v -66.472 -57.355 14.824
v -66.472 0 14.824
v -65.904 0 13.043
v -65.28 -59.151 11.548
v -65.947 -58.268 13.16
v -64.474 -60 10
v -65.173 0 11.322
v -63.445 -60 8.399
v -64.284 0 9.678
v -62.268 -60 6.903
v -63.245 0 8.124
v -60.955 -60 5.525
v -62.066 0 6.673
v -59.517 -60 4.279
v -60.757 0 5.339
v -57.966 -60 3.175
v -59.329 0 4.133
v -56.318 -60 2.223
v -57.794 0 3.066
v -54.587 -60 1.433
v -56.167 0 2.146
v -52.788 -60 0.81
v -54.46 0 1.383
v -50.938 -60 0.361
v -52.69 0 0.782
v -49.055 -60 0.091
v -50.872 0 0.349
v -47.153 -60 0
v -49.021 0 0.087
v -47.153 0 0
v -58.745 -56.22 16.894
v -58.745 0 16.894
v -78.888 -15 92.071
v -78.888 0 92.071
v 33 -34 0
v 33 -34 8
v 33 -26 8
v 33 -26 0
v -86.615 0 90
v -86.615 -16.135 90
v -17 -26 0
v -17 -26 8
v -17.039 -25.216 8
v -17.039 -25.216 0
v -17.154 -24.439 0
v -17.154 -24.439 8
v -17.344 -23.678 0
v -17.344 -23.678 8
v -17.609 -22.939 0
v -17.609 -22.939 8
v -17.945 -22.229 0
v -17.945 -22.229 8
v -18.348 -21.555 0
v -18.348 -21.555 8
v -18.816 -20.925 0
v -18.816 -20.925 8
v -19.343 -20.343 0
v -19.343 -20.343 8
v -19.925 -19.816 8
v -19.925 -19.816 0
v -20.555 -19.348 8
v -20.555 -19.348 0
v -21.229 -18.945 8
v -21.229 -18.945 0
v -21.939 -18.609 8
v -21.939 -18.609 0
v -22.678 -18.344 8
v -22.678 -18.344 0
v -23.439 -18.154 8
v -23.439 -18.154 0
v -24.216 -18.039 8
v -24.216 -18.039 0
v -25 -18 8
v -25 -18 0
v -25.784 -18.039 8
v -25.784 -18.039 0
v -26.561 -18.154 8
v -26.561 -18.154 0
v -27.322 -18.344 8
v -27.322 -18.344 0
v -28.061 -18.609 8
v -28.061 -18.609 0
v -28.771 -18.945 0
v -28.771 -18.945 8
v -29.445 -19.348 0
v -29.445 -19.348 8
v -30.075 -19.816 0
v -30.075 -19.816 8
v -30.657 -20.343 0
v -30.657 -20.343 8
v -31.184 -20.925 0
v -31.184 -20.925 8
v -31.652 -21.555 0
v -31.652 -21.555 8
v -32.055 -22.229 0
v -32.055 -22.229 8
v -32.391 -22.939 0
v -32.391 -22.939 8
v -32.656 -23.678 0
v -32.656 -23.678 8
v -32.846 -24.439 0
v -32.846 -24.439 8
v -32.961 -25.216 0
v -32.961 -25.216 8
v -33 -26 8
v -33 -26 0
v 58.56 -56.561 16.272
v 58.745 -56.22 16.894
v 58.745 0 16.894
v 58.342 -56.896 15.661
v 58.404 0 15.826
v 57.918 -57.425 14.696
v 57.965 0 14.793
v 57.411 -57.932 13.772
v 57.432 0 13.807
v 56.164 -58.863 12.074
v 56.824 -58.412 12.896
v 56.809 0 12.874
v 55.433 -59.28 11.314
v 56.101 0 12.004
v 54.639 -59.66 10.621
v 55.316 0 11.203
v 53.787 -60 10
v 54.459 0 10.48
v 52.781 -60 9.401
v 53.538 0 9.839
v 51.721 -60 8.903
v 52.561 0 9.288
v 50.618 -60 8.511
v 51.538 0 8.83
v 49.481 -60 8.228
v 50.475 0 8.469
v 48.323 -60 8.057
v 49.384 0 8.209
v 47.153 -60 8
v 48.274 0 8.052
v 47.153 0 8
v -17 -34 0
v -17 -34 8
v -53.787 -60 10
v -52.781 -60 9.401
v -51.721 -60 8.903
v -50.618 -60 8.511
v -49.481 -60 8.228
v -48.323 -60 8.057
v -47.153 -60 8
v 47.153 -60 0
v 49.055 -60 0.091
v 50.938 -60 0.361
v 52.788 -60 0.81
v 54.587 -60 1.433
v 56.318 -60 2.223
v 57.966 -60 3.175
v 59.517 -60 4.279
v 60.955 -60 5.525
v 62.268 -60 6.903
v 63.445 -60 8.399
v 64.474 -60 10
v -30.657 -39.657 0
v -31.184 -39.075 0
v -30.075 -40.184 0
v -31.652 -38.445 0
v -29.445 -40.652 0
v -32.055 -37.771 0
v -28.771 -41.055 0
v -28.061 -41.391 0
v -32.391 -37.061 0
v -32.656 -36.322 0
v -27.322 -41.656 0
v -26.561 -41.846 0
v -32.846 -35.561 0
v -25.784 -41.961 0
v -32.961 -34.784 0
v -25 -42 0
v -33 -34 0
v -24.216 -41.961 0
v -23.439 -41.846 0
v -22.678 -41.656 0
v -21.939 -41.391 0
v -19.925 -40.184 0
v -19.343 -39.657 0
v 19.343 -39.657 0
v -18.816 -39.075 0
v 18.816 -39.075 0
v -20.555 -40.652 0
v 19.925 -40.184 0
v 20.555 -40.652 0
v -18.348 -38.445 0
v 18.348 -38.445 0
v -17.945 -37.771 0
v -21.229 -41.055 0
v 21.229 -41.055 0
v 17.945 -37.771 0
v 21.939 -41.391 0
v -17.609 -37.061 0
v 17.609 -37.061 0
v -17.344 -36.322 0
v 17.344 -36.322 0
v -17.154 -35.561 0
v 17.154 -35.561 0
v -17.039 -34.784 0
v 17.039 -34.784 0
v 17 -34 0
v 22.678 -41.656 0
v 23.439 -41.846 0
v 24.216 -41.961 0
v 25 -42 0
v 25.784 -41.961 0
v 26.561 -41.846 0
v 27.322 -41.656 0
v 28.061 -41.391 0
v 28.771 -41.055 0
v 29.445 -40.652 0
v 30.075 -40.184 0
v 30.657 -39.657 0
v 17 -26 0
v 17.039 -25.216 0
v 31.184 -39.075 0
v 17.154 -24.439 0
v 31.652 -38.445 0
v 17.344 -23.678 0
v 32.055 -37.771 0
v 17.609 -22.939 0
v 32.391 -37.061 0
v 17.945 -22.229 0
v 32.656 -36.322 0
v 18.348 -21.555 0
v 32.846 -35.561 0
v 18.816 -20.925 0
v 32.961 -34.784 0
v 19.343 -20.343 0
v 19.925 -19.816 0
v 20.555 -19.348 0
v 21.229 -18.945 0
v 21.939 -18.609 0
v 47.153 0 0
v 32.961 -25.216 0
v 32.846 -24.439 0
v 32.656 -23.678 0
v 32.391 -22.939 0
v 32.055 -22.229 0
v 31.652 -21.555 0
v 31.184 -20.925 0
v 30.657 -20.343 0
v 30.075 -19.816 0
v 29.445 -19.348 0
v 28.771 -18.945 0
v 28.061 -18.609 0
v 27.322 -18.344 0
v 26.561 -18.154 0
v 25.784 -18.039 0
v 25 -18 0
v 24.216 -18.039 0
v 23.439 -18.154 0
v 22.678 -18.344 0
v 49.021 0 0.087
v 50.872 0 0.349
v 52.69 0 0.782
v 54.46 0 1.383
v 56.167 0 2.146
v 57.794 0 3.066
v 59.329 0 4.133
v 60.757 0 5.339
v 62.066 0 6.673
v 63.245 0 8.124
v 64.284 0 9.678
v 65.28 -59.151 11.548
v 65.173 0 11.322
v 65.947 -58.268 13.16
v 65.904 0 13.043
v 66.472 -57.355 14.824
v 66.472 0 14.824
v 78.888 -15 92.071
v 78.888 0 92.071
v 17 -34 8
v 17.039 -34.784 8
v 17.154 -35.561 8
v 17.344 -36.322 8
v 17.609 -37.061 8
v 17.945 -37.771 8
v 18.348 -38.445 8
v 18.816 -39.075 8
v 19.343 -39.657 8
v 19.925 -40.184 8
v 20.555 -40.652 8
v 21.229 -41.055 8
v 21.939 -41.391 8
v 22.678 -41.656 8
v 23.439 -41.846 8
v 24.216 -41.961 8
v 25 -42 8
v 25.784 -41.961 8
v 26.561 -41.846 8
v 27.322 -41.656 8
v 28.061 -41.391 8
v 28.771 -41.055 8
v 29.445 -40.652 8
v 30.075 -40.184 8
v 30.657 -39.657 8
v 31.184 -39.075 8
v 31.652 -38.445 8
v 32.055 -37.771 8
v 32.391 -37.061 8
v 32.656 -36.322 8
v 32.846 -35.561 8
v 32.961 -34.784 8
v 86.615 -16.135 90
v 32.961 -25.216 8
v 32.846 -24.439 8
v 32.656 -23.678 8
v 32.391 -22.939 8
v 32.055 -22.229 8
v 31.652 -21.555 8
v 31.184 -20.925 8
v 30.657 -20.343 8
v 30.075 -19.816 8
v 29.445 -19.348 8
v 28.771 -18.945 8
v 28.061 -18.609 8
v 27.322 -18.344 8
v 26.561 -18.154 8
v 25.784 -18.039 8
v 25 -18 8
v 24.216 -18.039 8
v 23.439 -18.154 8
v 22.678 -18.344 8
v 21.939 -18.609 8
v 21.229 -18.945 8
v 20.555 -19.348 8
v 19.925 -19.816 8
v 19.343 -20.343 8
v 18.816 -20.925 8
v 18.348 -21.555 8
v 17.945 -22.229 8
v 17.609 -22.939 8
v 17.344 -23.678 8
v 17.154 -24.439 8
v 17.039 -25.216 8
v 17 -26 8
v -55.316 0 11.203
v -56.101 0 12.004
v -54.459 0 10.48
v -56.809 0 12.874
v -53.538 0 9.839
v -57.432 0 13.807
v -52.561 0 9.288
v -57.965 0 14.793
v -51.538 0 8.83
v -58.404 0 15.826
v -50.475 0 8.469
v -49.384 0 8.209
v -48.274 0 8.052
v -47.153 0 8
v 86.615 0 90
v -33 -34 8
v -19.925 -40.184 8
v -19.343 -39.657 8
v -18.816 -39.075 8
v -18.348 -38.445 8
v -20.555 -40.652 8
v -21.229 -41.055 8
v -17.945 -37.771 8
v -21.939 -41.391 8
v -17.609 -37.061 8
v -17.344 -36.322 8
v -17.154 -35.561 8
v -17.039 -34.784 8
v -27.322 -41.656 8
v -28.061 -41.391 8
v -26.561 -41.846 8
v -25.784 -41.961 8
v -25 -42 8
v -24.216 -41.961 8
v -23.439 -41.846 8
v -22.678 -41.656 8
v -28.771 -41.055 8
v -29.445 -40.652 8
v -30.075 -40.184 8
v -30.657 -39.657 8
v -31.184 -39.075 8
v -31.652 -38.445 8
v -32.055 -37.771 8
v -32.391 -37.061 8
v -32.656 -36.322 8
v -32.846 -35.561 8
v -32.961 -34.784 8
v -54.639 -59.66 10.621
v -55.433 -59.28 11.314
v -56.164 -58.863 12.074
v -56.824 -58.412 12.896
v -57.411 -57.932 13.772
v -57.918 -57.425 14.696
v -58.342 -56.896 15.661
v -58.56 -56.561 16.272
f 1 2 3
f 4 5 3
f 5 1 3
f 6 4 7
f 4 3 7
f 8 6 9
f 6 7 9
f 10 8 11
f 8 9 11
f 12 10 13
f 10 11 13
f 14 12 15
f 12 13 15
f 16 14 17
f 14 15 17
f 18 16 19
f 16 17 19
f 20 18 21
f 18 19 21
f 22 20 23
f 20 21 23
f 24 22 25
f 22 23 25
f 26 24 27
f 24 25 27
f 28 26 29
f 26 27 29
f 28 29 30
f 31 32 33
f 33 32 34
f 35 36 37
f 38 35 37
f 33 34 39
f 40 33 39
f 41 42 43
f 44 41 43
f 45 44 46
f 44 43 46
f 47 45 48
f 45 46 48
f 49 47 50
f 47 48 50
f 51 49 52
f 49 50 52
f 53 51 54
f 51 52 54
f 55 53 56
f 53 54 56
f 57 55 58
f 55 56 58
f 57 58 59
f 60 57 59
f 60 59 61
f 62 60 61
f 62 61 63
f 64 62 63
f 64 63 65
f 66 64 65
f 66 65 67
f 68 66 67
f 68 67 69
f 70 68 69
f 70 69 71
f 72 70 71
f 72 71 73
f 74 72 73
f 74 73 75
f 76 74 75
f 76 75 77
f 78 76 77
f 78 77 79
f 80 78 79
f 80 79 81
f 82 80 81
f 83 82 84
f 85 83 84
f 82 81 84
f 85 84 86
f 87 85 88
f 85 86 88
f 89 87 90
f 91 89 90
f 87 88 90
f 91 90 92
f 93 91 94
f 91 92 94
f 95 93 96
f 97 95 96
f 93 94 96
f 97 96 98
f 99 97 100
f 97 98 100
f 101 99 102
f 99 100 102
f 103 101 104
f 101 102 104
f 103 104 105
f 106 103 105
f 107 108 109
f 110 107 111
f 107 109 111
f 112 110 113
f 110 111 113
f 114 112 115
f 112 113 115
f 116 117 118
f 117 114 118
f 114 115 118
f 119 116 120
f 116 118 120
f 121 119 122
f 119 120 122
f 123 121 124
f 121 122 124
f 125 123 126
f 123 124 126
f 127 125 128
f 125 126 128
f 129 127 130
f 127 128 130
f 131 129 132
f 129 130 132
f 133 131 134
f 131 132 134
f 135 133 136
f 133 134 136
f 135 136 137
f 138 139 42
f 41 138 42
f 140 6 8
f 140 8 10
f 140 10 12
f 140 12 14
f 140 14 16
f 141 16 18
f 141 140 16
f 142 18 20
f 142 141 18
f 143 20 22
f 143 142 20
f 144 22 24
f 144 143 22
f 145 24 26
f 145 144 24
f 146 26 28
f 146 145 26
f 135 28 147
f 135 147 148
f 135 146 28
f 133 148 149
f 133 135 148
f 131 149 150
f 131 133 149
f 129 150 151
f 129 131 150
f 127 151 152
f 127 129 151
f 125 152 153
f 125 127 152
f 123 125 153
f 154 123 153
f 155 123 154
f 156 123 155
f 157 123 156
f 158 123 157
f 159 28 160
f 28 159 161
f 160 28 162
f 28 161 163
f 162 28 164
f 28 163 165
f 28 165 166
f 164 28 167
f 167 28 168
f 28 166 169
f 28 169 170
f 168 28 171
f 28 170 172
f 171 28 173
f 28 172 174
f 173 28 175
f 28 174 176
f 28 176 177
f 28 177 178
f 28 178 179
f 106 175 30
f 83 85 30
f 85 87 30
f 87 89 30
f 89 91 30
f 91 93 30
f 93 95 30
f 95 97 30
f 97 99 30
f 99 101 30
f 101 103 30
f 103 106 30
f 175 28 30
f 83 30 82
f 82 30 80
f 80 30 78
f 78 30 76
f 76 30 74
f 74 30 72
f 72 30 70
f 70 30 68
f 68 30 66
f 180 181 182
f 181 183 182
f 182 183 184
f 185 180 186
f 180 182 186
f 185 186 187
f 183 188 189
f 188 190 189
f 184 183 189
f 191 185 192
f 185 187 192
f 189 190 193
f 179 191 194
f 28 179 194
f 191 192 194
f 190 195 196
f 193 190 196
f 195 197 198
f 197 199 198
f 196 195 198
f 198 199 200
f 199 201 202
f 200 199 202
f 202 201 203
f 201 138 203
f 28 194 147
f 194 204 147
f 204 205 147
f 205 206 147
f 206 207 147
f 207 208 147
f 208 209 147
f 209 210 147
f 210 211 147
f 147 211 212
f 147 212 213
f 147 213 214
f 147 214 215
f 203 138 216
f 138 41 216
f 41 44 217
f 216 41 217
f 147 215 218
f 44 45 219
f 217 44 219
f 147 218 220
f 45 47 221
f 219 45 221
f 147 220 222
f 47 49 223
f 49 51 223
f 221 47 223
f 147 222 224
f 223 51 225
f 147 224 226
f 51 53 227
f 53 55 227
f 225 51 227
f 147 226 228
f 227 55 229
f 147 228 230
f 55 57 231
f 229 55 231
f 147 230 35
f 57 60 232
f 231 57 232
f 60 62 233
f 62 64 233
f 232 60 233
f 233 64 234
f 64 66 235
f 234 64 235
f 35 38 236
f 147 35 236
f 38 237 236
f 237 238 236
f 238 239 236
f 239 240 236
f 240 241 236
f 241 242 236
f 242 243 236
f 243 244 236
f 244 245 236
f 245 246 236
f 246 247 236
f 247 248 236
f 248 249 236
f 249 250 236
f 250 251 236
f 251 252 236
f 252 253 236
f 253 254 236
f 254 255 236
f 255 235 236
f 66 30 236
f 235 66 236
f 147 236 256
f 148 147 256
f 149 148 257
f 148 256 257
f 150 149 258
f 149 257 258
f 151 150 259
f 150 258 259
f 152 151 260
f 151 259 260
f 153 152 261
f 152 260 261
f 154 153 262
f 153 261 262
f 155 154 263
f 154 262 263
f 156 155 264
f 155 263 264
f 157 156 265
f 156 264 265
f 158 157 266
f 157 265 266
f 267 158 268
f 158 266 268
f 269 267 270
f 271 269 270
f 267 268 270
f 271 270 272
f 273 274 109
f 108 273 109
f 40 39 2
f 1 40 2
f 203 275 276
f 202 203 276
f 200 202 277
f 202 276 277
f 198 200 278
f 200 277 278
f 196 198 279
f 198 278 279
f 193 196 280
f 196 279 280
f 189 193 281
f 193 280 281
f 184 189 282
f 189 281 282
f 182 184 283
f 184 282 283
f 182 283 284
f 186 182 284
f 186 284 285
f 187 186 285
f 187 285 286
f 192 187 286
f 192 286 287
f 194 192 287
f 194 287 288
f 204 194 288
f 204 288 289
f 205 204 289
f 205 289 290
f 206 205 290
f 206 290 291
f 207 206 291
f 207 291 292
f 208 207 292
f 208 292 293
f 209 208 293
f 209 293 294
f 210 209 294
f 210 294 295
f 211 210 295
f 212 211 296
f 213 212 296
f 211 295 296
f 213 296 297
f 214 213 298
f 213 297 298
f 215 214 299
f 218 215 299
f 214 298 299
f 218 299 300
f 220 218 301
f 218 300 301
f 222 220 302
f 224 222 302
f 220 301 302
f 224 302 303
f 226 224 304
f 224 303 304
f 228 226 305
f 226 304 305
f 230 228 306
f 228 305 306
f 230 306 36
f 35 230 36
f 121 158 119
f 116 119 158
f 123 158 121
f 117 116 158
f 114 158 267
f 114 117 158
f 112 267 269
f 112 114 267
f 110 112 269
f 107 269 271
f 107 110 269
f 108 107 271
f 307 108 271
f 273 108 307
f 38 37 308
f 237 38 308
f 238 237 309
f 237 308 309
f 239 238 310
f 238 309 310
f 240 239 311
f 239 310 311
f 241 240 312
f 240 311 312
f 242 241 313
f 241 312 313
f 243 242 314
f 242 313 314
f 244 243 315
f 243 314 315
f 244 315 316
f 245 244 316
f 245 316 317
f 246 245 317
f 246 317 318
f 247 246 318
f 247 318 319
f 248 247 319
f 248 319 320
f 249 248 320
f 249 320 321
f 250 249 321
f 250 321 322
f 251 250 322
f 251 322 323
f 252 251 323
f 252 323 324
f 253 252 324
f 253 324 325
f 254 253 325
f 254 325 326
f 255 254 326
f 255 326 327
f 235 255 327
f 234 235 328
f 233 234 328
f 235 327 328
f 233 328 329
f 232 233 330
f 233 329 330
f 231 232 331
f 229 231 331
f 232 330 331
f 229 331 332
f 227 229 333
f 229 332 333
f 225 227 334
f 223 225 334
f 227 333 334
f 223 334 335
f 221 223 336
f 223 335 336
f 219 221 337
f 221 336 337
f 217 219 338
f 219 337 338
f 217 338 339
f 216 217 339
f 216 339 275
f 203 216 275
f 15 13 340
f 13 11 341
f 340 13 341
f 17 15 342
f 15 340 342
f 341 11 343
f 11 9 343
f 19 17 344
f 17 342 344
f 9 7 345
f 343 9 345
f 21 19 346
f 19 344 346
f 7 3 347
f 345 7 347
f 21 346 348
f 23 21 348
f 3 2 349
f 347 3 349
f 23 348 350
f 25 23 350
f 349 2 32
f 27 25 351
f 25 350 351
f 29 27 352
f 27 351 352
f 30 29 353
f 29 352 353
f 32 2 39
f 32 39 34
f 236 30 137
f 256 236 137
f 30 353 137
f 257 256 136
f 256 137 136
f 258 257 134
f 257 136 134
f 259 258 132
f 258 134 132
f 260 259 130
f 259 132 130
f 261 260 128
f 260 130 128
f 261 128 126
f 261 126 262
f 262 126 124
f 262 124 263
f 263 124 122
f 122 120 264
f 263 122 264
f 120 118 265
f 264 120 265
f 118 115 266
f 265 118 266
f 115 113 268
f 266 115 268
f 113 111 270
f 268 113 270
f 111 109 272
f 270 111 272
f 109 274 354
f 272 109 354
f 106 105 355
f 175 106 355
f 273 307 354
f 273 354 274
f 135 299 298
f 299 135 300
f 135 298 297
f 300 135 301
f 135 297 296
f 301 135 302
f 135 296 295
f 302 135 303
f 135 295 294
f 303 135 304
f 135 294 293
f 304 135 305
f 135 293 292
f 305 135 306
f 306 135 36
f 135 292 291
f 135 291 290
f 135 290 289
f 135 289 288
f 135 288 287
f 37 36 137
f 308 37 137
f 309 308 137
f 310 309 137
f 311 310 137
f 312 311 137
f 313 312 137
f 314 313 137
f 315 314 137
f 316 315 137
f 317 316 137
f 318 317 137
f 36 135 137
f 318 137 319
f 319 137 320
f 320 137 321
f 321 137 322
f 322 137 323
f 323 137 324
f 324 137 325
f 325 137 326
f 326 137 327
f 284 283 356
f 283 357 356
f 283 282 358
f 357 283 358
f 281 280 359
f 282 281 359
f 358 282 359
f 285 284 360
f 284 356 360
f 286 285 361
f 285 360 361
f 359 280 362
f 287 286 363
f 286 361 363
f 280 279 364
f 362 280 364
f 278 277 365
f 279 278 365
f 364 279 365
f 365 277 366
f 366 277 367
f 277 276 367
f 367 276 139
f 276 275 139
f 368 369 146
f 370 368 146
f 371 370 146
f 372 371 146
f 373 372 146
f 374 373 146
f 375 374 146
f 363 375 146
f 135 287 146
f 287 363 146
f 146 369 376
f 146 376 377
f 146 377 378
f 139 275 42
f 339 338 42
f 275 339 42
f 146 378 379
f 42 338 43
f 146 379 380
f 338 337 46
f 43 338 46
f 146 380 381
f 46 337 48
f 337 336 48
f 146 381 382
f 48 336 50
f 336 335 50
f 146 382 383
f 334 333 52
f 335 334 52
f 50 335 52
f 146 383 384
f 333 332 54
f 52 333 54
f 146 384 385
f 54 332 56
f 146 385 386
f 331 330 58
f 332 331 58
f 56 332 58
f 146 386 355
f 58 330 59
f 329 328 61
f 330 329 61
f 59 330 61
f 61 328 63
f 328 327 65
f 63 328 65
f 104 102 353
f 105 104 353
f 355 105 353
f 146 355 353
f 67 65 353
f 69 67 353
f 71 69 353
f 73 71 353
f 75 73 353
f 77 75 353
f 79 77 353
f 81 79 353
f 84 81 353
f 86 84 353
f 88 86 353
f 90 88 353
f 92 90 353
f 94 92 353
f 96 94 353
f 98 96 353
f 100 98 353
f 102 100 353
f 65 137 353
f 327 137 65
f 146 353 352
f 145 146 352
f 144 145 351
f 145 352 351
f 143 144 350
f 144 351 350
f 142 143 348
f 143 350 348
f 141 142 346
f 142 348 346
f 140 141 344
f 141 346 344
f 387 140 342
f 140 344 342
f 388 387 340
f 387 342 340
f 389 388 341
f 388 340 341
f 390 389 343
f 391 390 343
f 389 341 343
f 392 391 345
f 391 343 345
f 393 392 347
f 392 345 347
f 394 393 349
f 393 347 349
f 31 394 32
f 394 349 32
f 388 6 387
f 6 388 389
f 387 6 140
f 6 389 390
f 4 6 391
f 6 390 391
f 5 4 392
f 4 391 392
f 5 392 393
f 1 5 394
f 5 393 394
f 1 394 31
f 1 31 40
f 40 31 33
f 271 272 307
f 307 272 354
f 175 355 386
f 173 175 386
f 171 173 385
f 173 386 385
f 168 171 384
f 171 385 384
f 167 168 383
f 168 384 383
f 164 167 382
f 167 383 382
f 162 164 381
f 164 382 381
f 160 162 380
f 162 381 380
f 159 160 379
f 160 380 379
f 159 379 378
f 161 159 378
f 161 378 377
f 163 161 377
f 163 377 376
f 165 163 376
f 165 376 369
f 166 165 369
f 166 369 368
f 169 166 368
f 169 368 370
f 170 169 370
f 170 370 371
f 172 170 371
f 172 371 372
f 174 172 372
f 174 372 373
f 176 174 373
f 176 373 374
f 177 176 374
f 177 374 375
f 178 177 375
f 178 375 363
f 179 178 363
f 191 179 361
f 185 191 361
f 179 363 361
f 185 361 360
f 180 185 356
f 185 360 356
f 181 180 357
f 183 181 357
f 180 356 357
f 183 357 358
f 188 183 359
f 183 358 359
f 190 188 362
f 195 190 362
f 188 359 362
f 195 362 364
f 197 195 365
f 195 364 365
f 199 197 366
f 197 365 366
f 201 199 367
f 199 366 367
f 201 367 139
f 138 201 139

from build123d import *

# Parameters (mm, degrees)
F1_DEPTH      = 60
F3_DEPTH      = 86.6164273188
F3_DEPTH_BACK = 86.6164273188
F5_DEPTH      = 8.001


with BuildPart() as f1:
    # F0 (on Front) → F1 (new body)
    with BuildSketch(Plane.XZ):
        with BuildLine():
            ThreePointArc((-66.4719767662, 14.8236190979), (-59.3286888206, 4.1329331942), (-47.1534602404, 0))
            Line((-47.1534602404, 0), (47.1534602404, 0))
            ThreePointArc((47.1534602404, 0), (59.3286888206, 4.1329331942), (66.4719767662, 14.8236190979))
            Line((66.4719767662, 14.8236190979), (86.6154273188, 90))
            Line((86.6154273188, 90), (78.8880207085, 92.0705523608))
            Line((78.8880207085, 92.0705523608), (58.7445701559, 16.8941714588))
            ThreePointArc((58.7445701559, 16.8941714588), (54.4585973885, 10.4797599165), (47.1534602404, 8))
            Line((47.1534602404, 8), (-47.1534602404, 8))
            ThreePointArc((-47.1534602404, 8), (-54.4585973885, 10.4797599165), (-58.7445701559, 16.8941714588))
            Line((-58.7445701559, 16.8941714588), (-78.8880207085, 92.0705523608))
            Line((-78.8880207085, 92.0705523608), (-86.6154273188, 90))
            Line((-86.6154273188, 90), (-66.4719767662, 14.8236190979))
        make_face()
    extrude(amount=F1_DEPTH)

    # F2 (on Right) → F3 (cut, two sides)
    with BuildSketch(Plane.YZ) as f3_sk:
        Polygon((-15, 92.0705523608), (-60, 92.0705523608), (-60, 10), align=None)
    extrude(amount=-F3_DEPTH, mode=Mode.SUBTRACT)
    extrude(f3_sk.sketch, amount=F3_DEPTH_BACK, mode=Mode.SUBTRACT)

    # F4 (on face) → F5 (cut, through all)
    with BuildSketch(Plane.XY.offset(8)):
        with BuildLine():
            Line((-33, -26), (-33, -34))
            ThreePointArc((-33, -34), (-25, -42), (-17, -34))
            Line((-17, -34), (-17, -26))
            ThreePointArc((-17, -26), (-25, -18), (-33, -26))
        make_face()
        with BuildLine():
            ThreePointArc((33, -26), (25, -18), (17, -26))
            Line((17, -26), (17, -34))
            ThreePointArc((17, -34), (25, -42), (33, -34))
            Line((33, -34), (33, -26))
        make_face()
    extrude(amount=-F5_DEPTH, mode=Mode.SUBTRACT)


solid = f1.part
